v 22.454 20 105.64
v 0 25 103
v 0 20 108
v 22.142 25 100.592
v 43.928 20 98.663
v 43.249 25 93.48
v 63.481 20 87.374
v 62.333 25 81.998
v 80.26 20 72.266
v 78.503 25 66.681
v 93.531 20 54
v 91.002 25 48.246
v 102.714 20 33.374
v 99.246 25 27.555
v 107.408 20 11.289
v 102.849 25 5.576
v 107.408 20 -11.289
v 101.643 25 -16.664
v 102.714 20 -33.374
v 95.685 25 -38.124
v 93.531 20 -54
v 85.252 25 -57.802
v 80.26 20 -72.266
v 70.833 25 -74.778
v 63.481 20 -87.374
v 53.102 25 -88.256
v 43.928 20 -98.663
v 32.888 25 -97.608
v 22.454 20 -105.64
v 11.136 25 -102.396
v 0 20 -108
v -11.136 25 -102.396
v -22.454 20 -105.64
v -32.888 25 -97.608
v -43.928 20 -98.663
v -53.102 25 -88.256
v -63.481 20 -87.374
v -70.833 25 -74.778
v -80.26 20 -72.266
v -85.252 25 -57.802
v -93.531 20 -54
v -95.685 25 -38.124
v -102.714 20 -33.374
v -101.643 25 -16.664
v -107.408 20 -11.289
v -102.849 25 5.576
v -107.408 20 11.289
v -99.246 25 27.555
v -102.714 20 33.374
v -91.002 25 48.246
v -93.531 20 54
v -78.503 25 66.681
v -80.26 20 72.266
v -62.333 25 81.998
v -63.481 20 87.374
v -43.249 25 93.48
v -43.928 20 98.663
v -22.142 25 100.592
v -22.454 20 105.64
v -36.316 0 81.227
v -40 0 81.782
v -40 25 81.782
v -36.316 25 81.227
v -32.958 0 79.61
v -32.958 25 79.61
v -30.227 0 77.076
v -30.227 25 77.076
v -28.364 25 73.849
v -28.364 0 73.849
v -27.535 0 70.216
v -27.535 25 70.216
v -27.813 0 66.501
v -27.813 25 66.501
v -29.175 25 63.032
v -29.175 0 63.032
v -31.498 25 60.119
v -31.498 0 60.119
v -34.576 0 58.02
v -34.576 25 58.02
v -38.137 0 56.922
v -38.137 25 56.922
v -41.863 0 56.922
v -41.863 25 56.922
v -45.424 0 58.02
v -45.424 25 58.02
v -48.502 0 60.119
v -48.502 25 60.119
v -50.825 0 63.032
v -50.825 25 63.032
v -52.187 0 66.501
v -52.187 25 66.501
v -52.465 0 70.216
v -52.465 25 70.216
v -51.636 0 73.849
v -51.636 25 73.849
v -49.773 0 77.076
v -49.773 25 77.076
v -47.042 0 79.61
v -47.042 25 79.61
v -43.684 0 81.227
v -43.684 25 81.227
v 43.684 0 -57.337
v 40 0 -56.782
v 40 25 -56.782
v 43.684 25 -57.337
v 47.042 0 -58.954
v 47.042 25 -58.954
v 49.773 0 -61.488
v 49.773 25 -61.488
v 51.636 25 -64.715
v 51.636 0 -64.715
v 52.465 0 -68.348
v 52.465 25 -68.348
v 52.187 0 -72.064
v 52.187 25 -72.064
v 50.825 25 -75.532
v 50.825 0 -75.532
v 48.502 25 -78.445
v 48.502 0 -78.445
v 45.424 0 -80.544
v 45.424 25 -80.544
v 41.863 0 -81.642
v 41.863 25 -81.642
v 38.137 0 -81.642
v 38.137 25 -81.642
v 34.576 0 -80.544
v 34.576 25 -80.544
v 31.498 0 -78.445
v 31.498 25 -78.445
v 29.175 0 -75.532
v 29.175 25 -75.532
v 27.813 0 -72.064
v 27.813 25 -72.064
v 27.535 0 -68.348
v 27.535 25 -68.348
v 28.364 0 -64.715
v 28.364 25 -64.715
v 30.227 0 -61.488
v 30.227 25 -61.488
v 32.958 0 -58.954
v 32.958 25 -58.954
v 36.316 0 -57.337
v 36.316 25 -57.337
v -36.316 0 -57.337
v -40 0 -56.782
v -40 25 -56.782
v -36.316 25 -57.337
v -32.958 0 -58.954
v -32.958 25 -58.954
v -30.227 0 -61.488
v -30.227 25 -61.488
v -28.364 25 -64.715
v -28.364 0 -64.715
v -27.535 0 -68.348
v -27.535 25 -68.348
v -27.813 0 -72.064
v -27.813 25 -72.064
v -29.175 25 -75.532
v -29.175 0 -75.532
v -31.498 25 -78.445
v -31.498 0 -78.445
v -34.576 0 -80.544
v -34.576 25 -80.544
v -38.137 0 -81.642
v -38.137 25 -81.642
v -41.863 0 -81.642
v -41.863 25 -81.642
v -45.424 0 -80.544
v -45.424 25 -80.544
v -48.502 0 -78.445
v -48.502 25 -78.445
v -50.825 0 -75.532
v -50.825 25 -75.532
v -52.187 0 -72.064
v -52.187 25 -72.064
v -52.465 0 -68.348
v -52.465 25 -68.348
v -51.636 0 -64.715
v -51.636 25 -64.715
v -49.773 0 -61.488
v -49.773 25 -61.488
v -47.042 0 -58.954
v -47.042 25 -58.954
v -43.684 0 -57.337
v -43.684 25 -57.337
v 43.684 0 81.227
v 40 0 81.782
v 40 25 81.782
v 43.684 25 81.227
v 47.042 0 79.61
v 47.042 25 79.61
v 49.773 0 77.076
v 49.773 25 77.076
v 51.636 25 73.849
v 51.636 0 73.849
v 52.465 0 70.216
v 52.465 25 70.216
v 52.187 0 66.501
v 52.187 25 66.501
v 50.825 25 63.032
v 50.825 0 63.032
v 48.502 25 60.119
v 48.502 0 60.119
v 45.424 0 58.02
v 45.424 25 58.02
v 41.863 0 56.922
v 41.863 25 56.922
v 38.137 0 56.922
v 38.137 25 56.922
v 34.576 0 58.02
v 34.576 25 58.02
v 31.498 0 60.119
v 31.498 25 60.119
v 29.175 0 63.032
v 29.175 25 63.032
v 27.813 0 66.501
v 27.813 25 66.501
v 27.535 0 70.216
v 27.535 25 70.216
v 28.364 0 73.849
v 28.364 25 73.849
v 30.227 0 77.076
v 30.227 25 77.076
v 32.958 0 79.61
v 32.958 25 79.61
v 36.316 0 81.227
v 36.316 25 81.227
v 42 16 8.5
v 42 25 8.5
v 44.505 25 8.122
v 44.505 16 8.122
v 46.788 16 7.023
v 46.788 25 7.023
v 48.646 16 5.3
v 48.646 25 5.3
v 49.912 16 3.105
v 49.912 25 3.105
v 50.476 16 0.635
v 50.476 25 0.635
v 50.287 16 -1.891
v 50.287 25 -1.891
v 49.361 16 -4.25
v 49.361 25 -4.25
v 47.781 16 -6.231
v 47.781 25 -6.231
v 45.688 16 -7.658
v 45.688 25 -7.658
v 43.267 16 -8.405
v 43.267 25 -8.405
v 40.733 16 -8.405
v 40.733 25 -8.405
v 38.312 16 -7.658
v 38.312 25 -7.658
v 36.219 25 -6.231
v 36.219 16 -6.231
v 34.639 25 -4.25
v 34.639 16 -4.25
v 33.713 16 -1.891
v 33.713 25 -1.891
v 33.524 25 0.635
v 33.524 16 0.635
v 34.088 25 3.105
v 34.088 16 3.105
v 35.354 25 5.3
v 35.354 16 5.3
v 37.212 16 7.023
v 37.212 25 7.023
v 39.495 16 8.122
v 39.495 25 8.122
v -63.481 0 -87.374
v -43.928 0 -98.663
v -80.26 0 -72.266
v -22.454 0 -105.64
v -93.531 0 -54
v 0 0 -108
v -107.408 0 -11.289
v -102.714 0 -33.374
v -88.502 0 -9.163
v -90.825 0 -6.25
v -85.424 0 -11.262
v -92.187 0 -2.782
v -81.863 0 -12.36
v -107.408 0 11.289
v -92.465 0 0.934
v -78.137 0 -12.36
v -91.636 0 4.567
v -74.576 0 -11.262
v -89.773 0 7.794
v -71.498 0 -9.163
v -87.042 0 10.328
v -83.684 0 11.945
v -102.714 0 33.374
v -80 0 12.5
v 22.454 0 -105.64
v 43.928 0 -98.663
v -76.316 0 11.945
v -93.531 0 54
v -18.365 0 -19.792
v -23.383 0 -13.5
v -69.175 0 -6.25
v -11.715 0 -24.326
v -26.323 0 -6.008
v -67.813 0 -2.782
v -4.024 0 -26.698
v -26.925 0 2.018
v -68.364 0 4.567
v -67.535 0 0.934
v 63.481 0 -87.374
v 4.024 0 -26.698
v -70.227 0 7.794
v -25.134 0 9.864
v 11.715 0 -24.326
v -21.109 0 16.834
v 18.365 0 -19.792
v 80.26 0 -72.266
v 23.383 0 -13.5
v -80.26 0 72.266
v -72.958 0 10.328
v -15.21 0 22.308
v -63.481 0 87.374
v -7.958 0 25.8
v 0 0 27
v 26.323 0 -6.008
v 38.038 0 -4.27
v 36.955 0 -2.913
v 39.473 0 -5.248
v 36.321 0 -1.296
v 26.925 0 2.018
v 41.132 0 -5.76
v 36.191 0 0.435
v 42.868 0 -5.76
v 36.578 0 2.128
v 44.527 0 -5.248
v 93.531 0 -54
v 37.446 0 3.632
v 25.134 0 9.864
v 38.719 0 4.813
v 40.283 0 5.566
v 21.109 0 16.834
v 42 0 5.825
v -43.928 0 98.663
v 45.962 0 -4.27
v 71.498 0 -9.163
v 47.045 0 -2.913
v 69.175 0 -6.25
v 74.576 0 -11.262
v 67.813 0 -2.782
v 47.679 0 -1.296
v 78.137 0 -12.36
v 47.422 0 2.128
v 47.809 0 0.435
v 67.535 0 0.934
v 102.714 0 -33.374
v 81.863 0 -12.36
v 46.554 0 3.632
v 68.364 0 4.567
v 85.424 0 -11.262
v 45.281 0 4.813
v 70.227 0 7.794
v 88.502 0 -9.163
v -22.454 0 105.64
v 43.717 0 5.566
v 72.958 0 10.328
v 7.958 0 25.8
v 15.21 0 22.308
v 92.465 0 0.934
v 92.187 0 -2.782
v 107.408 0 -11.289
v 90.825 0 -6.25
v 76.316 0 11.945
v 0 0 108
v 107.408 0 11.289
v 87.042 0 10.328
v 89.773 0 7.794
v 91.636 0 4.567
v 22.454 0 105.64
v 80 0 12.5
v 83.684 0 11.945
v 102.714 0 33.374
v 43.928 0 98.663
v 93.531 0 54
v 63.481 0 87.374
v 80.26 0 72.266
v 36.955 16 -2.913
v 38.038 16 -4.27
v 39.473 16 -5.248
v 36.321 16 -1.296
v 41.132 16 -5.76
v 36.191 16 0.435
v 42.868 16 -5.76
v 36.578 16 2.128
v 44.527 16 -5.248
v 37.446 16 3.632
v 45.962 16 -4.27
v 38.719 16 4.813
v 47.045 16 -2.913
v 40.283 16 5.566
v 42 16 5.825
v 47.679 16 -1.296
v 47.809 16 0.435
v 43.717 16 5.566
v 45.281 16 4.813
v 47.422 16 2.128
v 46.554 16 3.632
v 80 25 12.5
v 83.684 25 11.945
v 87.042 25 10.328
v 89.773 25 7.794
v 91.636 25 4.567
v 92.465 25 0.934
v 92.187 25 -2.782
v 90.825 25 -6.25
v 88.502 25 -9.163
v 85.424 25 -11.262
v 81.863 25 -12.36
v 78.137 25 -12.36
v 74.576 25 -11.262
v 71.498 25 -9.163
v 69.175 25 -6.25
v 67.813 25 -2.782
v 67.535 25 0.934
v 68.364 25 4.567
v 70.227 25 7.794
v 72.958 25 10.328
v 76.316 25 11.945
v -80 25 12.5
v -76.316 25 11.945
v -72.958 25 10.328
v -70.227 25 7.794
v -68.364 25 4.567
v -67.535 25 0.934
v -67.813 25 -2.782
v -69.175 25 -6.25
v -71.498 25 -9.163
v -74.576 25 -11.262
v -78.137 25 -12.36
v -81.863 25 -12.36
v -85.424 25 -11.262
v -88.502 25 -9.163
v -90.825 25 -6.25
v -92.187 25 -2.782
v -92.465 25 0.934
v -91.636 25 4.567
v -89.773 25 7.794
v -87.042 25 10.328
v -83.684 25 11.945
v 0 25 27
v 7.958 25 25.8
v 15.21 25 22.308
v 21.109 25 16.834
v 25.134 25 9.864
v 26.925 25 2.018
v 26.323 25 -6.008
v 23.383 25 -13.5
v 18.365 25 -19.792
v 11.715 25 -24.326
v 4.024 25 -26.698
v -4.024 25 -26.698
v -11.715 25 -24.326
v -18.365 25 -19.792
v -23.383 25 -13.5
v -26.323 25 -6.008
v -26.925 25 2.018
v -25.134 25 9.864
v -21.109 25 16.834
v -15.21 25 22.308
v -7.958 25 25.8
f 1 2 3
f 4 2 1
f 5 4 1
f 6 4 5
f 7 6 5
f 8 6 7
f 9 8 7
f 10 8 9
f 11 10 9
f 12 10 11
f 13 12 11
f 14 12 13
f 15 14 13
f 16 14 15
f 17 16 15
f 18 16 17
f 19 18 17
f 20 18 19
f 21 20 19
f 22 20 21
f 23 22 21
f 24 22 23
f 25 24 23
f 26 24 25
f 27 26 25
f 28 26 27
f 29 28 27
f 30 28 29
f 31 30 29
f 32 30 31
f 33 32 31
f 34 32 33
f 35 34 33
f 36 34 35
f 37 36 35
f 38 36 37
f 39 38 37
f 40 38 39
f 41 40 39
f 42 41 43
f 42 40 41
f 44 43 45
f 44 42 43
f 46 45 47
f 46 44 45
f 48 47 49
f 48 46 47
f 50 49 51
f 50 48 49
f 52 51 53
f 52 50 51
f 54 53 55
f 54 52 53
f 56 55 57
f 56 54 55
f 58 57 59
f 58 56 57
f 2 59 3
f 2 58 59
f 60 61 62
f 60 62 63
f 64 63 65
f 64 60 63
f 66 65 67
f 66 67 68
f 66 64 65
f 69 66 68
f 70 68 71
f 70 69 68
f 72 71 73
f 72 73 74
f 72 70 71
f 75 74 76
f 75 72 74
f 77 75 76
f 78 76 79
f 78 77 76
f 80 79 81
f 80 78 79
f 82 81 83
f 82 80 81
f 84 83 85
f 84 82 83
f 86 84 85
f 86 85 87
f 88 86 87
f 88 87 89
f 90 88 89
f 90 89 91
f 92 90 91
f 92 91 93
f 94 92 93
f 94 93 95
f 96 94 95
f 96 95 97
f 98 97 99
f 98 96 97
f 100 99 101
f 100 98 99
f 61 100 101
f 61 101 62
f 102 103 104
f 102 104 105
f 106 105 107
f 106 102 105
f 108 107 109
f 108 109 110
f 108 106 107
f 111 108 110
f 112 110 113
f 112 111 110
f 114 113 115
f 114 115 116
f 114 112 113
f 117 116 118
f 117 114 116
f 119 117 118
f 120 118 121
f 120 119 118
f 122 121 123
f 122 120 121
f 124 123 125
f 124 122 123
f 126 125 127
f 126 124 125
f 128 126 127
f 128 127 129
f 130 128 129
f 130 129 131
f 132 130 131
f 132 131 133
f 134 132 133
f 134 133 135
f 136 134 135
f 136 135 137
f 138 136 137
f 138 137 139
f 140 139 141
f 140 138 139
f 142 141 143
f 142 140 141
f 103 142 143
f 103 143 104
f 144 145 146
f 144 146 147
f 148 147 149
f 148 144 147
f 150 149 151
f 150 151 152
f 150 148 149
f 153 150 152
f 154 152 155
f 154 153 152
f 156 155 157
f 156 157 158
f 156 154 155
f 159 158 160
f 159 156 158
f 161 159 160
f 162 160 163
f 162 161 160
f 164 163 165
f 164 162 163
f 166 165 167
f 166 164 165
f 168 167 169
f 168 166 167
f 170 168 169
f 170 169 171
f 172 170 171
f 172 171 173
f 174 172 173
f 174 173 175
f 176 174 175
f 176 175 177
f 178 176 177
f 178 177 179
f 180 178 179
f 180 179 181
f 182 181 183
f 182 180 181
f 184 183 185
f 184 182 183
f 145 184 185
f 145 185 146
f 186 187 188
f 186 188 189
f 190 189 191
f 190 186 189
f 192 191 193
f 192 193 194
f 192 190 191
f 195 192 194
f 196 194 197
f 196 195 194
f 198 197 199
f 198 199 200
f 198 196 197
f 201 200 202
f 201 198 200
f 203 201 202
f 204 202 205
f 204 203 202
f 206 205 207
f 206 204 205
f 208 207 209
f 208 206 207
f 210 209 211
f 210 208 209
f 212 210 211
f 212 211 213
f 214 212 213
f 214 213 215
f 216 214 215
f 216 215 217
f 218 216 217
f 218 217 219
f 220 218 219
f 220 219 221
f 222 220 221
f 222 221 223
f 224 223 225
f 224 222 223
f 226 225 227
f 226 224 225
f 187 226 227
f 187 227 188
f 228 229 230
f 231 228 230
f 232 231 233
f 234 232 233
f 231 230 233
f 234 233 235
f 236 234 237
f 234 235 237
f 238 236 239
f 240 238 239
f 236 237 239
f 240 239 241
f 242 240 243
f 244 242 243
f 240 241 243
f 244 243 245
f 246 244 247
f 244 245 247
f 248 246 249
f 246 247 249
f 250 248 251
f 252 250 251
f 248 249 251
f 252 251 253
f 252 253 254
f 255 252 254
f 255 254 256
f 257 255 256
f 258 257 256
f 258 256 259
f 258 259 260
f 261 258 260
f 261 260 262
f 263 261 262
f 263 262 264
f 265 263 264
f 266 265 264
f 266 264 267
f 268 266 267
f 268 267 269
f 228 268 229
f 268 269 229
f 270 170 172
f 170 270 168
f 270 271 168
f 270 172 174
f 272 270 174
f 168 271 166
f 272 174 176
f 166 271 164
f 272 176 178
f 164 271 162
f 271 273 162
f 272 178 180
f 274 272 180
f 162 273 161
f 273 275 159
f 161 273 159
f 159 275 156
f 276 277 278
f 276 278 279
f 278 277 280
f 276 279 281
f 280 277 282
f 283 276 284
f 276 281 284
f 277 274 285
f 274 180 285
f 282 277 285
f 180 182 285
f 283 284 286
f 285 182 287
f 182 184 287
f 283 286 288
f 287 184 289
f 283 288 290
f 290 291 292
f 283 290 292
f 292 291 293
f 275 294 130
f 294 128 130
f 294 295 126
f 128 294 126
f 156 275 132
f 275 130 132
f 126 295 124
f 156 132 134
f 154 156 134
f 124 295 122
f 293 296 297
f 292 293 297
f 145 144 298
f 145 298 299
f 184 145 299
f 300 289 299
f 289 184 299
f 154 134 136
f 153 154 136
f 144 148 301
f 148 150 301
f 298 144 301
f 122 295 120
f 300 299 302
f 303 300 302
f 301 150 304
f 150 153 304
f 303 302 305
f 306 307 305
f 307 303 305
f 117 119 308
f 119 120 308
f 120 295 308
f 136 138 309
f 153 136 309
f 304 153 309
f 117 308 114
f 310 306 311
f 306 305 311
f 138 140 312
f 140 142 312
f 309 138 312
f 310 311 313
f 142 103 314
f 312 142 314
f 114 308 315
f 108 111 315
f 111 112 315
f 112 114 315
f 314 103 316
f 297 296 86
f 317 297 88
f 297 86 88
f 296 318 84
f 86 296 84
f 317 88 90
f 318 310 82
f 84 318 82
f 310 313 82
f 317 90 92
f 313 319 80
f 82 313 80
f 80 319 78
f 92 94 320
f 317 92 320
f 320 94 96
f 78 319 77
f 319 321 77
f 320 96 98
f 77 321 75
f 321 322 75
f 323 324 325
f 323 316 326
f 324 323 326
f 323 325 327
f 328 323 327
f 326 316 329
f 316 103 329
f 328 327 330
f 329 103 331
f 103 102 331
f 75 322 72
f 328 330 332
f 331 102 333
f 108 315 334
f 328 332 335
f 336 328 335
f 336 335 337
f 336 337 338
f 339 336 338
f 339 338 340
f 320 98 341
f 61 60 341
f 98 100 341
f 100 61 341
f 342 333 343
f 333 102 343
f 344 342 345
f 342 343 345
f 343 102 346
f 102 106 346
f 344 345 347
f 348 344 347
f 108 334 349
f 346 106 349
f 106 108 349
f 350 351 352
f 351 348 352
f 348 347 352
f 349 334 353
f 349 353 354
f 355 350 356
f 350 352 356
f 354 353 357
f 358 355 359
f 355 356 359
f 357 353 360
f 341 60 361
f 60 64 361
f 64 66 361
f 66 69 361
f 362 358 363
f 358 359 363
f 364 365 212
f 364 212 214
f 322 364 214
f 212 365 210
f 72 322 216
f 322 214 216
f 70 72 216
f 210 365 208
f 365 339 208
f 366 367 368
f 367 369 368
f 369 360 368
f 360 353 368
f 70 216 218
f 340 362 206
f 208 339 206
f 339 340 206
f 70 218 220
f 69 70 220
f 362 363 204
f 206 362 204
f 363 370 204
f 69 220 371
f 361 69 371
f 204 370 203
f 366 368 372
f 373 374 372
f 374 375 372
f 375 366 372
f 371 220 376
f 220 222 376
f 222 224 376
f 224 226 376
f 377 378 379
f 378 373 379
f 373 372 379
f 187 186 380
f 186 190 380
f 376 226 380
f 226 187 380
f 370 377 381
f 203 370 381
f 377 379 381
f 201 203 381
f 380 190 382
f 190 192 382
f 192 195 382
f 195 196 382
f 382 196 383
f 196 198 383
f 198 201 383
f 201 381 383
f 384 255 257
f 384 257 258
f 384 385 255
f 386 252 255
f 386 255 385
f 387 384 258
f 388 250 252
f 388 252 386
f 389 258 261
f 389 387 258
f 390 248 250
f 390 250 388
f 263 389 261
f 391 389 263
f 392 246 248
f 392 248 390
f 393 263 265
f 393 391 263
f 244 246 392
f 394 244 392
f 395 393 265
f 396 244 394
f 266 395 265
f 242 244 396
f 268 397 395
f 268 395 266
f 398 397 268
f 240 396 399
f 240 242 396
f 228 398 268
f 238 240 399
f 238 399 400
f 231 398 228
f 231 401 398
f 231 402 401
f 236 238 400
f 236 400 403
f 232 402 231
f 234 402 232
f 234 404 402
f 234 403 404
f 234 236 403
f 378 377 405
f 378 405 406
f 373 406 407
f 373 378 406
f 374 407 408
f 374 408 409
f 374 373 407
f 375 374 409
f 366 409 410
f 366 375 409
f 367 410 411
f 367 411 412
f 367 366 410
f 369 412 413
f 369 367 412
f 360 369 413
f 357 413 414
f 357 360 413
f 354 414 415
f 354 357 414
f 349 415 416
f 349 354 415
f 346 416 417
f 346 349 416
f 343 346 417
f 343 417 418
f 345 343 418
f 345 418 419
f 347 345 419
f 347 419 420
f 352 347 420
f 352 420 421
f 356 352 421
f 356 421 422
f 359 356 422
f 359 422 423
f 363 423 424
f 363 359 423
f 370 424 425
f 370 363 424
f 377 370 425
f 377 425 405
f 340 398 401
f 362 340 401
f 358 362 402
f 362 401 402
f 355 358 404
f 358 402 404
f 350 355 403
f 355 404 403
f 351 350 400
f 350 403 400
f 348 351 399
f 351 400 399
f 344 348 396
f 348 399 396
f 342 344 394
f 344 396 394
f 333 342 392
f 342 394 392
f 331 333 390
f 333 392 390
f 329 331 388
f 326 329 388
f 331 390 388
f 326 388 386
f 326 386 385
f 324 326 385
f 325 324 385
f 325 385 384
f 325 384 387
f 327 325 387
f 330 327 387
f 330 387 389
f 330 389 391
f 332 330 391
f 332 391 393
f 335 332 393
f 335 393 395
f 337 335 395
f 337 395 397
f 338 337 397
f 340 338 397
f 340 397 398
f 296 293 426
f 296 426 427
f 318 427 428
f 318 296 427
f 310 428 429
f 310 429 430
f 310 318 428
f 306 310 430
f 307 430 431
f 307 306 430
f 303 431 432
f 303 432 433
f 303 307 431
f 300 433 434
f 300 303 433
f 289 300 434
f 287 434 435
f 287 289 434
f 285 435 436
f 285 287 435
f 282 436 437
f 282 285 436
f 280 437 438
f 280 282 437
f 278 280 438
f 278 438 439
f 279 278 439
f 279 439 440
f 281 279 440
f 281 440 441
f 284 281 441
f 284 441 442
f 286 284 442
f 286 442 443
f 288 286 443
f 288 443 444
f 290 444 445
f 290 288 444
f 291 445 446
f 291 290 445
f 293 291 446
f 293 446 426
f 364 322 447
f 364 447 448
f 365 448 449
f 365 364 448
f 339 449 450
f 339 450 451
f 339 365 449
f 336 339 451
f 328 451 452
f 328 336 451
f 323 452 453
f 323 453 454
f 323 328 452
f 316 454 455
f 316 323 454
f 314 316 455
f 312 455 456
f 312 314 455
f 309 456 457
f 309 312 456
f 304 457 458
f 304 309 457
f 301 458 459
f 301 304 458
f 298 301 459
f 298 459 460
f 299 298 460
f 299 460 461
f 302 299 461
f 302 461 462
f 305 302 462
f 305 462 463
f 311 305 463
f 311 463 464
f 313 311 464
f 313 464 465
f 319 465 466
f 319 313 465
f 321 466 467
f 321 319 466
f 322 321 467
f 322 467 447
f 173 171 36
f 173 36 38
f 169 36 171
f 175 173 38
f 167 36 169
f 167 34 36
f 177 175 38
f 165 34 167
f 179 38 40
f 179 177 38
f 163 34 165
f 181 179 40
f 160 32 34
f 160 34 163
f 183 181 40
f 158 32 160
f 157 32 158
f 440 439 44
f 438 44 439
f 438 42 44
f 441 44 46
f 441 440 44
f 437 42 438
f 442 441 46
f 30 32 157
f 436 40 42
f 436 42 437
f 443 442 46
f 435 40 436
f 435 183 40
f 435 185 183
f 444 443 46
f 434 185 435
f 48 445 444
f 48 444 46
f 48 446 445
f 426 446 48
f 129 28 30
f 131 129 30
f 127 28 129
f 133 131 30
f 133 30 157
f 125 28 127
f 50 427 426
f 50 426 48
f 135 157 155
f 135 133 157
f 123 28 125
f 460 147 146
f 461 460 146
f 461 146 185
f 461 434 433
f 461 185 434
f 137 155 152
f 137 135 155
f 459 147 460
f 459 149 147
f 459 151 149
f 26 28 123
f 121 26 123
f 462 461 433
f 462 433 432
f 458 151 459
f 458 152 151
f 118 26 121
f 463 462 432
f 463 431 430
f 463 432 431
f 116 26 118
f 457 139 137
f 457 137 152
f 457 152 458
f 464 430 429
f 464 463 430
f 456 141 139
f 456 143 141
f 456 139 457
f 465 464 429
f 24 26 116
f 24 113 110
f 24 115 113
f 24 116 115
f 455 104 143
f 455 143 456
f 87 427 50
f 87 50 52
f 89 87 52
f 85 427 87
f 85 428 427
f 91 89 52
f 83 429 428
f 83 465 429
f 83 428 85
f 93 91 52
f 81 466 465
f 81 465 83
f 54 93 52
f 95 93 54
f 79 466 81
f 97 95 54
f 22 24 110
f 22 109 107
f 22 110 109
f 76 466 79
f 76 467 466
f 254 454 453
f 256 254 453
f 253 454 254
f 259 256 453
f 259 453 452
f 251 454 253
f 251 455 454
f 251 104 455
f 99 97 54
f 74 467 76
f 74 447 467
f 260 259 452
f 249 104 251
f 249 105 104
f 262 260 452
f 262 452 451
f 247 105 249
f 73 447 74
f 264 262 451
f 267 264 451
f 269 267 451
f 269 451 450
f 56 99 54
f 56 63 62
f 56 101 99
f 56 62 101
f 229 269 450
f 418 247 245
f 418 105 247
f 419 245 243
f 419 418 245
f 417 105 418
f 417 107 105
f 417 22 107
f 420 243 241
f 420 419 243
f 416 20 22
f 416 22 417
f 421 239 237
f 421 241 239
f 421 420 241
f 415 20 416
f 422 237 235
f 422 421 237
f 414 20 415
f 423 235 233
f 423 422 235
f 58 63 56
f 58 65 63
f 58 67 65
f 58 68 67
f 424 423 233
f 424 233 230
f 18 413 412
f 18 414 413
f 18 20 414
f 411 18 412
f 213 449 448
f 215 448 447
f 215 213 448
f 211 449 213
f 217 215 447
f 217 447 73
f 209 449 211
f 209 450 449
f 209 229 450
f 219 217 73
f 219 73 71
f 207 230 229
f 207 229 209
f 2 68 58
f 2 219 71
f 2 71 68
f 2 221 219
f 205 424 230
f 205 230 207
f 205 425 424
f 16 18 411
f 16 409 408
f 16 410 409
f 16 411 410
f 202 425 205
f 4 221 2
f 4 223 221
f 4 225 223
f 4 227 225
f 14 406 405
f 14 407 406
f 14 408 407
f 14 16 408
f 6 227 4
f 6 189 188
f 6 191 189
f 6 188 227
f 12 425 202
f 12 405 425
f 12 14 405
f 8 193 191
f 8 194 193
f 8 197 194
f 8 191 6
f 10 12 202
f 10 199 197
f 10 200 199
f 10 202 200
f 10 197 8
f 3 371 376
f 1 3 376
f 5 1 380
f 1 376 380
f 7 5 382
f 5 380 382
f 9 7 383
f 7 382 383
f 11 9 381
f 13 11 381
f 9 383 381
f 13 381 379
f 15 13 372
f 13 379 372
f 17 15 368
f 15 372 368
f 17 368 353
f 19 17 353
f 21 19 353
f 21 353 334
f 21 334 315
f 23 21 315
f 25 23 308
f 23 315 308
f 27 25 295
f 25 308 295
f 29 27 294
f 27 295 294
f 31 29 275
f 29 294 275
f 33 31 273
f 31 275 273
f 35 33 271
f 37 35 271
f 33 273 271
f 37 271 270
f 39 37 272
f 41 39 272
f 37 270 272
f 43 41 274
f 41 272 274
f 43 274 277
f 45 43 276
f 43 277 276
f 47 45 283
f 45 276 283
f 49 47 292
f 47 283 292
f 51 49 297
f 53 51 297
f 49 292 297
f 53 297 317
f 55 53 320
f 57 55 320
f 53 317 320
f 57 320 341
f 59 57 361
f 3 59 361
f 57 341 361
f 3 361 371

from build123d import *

# Parameters (mm, degrees)
SKETCH1_R               = 108
SKETCH1_R_2             = 27
SKETCH1_R_3             = 12.5
BOSS_EXTRUDE1_DEPTH     = 25
CHAMFER1_SIZE           = 5
M12X0_35_TAPPED_HOLE2_D = 11.65
SKETCH4_R               = 8.5
CUT_EXTRUDE2_DEPTH      = 9


with BuildPart() as part:
    # Sketch1 → Boss-Extrude1 (new body)
    with BuildSketch(Plane(origin=(0, 0, 0), x_dir=(1, 0, 0), z_dir=(0, 1, 0))):
        with Locations(Location((0, 0, 0), (0, 0, 270))):
            Circle(SKETCH1_R)
        with Locations(Location((0, 0, 0), (0, 0, 270))):
            Circle(SKETCH1_R_2, mode=Mode.SUBTRACT)
        with Locations(Location((40, 69.282032303, 0), (0, 0, 270))):
            Circle(SKETCH1_R_3, mode=Mode.SUBTRACT)
        with Locations(Location((80, 0, 0), (0, 0, 270))):
            Circle(SKETCH1_R_3, mode=Mode.SUBTRACT)
        with Locations(Location((40, -69.282032303, 0), (0, 0, 270))):
            Circle(SKETCH1_R_3, mode=Mode.SUBTRACT)
        with Locations(Location((-40, -69.282032303, 0), (0, 0, 270))):
            Circle(SKETCH1_R_3, mode=Mode.SUBTRACT)
        with Locations(Location((-80, 0, 0), (0, 0, 270))):
            Circle(SKETCH1_R_3, mode=Mode.SUBTRACT)
        with Locations(Location((-40, 69.282032303, 0), (0, 0, 270))):
            Circle(SKETCH1_R_3, mode=Mode.SUBTRACT)
    extrude(amount=BOSS_EXTRUDE1_DEPTH)

    # Chamfer1
    chamfer1_edges = [part.edges().sort_by_distance(p)[0] for p in [
        (0, 25, -108),
    ]]
    chamfer(chamfer1_edges, length=CHAMFER1_SIZE)

    # M12x0.35 Tapped Hole2 (through all)
    with Locations(Plane(origin=(42, 0, 0), x_dir=(0, 0, -1), z_dir=(0, -1, 0))):
        with Locations((0, 0)):
            Hole(M12X0_35_TAPPED_HOLE2_D / 2)

    # Sketch4 → Cut-Extrude2 (cut)
    with BuildSketch(Plane(origin=(0, 25, 0), x_dir=(1, 0, 0), z_dir=(0, 1, 0))):
        with Locations(Location((42, 0, 0), (0, 0, 270))):
            Circle(SKETCH4_R)
    extrude(amount=-CUT_EXTRUDE2_DEPTH, mode=Mode.SUBTRACT)


solid = part.part
